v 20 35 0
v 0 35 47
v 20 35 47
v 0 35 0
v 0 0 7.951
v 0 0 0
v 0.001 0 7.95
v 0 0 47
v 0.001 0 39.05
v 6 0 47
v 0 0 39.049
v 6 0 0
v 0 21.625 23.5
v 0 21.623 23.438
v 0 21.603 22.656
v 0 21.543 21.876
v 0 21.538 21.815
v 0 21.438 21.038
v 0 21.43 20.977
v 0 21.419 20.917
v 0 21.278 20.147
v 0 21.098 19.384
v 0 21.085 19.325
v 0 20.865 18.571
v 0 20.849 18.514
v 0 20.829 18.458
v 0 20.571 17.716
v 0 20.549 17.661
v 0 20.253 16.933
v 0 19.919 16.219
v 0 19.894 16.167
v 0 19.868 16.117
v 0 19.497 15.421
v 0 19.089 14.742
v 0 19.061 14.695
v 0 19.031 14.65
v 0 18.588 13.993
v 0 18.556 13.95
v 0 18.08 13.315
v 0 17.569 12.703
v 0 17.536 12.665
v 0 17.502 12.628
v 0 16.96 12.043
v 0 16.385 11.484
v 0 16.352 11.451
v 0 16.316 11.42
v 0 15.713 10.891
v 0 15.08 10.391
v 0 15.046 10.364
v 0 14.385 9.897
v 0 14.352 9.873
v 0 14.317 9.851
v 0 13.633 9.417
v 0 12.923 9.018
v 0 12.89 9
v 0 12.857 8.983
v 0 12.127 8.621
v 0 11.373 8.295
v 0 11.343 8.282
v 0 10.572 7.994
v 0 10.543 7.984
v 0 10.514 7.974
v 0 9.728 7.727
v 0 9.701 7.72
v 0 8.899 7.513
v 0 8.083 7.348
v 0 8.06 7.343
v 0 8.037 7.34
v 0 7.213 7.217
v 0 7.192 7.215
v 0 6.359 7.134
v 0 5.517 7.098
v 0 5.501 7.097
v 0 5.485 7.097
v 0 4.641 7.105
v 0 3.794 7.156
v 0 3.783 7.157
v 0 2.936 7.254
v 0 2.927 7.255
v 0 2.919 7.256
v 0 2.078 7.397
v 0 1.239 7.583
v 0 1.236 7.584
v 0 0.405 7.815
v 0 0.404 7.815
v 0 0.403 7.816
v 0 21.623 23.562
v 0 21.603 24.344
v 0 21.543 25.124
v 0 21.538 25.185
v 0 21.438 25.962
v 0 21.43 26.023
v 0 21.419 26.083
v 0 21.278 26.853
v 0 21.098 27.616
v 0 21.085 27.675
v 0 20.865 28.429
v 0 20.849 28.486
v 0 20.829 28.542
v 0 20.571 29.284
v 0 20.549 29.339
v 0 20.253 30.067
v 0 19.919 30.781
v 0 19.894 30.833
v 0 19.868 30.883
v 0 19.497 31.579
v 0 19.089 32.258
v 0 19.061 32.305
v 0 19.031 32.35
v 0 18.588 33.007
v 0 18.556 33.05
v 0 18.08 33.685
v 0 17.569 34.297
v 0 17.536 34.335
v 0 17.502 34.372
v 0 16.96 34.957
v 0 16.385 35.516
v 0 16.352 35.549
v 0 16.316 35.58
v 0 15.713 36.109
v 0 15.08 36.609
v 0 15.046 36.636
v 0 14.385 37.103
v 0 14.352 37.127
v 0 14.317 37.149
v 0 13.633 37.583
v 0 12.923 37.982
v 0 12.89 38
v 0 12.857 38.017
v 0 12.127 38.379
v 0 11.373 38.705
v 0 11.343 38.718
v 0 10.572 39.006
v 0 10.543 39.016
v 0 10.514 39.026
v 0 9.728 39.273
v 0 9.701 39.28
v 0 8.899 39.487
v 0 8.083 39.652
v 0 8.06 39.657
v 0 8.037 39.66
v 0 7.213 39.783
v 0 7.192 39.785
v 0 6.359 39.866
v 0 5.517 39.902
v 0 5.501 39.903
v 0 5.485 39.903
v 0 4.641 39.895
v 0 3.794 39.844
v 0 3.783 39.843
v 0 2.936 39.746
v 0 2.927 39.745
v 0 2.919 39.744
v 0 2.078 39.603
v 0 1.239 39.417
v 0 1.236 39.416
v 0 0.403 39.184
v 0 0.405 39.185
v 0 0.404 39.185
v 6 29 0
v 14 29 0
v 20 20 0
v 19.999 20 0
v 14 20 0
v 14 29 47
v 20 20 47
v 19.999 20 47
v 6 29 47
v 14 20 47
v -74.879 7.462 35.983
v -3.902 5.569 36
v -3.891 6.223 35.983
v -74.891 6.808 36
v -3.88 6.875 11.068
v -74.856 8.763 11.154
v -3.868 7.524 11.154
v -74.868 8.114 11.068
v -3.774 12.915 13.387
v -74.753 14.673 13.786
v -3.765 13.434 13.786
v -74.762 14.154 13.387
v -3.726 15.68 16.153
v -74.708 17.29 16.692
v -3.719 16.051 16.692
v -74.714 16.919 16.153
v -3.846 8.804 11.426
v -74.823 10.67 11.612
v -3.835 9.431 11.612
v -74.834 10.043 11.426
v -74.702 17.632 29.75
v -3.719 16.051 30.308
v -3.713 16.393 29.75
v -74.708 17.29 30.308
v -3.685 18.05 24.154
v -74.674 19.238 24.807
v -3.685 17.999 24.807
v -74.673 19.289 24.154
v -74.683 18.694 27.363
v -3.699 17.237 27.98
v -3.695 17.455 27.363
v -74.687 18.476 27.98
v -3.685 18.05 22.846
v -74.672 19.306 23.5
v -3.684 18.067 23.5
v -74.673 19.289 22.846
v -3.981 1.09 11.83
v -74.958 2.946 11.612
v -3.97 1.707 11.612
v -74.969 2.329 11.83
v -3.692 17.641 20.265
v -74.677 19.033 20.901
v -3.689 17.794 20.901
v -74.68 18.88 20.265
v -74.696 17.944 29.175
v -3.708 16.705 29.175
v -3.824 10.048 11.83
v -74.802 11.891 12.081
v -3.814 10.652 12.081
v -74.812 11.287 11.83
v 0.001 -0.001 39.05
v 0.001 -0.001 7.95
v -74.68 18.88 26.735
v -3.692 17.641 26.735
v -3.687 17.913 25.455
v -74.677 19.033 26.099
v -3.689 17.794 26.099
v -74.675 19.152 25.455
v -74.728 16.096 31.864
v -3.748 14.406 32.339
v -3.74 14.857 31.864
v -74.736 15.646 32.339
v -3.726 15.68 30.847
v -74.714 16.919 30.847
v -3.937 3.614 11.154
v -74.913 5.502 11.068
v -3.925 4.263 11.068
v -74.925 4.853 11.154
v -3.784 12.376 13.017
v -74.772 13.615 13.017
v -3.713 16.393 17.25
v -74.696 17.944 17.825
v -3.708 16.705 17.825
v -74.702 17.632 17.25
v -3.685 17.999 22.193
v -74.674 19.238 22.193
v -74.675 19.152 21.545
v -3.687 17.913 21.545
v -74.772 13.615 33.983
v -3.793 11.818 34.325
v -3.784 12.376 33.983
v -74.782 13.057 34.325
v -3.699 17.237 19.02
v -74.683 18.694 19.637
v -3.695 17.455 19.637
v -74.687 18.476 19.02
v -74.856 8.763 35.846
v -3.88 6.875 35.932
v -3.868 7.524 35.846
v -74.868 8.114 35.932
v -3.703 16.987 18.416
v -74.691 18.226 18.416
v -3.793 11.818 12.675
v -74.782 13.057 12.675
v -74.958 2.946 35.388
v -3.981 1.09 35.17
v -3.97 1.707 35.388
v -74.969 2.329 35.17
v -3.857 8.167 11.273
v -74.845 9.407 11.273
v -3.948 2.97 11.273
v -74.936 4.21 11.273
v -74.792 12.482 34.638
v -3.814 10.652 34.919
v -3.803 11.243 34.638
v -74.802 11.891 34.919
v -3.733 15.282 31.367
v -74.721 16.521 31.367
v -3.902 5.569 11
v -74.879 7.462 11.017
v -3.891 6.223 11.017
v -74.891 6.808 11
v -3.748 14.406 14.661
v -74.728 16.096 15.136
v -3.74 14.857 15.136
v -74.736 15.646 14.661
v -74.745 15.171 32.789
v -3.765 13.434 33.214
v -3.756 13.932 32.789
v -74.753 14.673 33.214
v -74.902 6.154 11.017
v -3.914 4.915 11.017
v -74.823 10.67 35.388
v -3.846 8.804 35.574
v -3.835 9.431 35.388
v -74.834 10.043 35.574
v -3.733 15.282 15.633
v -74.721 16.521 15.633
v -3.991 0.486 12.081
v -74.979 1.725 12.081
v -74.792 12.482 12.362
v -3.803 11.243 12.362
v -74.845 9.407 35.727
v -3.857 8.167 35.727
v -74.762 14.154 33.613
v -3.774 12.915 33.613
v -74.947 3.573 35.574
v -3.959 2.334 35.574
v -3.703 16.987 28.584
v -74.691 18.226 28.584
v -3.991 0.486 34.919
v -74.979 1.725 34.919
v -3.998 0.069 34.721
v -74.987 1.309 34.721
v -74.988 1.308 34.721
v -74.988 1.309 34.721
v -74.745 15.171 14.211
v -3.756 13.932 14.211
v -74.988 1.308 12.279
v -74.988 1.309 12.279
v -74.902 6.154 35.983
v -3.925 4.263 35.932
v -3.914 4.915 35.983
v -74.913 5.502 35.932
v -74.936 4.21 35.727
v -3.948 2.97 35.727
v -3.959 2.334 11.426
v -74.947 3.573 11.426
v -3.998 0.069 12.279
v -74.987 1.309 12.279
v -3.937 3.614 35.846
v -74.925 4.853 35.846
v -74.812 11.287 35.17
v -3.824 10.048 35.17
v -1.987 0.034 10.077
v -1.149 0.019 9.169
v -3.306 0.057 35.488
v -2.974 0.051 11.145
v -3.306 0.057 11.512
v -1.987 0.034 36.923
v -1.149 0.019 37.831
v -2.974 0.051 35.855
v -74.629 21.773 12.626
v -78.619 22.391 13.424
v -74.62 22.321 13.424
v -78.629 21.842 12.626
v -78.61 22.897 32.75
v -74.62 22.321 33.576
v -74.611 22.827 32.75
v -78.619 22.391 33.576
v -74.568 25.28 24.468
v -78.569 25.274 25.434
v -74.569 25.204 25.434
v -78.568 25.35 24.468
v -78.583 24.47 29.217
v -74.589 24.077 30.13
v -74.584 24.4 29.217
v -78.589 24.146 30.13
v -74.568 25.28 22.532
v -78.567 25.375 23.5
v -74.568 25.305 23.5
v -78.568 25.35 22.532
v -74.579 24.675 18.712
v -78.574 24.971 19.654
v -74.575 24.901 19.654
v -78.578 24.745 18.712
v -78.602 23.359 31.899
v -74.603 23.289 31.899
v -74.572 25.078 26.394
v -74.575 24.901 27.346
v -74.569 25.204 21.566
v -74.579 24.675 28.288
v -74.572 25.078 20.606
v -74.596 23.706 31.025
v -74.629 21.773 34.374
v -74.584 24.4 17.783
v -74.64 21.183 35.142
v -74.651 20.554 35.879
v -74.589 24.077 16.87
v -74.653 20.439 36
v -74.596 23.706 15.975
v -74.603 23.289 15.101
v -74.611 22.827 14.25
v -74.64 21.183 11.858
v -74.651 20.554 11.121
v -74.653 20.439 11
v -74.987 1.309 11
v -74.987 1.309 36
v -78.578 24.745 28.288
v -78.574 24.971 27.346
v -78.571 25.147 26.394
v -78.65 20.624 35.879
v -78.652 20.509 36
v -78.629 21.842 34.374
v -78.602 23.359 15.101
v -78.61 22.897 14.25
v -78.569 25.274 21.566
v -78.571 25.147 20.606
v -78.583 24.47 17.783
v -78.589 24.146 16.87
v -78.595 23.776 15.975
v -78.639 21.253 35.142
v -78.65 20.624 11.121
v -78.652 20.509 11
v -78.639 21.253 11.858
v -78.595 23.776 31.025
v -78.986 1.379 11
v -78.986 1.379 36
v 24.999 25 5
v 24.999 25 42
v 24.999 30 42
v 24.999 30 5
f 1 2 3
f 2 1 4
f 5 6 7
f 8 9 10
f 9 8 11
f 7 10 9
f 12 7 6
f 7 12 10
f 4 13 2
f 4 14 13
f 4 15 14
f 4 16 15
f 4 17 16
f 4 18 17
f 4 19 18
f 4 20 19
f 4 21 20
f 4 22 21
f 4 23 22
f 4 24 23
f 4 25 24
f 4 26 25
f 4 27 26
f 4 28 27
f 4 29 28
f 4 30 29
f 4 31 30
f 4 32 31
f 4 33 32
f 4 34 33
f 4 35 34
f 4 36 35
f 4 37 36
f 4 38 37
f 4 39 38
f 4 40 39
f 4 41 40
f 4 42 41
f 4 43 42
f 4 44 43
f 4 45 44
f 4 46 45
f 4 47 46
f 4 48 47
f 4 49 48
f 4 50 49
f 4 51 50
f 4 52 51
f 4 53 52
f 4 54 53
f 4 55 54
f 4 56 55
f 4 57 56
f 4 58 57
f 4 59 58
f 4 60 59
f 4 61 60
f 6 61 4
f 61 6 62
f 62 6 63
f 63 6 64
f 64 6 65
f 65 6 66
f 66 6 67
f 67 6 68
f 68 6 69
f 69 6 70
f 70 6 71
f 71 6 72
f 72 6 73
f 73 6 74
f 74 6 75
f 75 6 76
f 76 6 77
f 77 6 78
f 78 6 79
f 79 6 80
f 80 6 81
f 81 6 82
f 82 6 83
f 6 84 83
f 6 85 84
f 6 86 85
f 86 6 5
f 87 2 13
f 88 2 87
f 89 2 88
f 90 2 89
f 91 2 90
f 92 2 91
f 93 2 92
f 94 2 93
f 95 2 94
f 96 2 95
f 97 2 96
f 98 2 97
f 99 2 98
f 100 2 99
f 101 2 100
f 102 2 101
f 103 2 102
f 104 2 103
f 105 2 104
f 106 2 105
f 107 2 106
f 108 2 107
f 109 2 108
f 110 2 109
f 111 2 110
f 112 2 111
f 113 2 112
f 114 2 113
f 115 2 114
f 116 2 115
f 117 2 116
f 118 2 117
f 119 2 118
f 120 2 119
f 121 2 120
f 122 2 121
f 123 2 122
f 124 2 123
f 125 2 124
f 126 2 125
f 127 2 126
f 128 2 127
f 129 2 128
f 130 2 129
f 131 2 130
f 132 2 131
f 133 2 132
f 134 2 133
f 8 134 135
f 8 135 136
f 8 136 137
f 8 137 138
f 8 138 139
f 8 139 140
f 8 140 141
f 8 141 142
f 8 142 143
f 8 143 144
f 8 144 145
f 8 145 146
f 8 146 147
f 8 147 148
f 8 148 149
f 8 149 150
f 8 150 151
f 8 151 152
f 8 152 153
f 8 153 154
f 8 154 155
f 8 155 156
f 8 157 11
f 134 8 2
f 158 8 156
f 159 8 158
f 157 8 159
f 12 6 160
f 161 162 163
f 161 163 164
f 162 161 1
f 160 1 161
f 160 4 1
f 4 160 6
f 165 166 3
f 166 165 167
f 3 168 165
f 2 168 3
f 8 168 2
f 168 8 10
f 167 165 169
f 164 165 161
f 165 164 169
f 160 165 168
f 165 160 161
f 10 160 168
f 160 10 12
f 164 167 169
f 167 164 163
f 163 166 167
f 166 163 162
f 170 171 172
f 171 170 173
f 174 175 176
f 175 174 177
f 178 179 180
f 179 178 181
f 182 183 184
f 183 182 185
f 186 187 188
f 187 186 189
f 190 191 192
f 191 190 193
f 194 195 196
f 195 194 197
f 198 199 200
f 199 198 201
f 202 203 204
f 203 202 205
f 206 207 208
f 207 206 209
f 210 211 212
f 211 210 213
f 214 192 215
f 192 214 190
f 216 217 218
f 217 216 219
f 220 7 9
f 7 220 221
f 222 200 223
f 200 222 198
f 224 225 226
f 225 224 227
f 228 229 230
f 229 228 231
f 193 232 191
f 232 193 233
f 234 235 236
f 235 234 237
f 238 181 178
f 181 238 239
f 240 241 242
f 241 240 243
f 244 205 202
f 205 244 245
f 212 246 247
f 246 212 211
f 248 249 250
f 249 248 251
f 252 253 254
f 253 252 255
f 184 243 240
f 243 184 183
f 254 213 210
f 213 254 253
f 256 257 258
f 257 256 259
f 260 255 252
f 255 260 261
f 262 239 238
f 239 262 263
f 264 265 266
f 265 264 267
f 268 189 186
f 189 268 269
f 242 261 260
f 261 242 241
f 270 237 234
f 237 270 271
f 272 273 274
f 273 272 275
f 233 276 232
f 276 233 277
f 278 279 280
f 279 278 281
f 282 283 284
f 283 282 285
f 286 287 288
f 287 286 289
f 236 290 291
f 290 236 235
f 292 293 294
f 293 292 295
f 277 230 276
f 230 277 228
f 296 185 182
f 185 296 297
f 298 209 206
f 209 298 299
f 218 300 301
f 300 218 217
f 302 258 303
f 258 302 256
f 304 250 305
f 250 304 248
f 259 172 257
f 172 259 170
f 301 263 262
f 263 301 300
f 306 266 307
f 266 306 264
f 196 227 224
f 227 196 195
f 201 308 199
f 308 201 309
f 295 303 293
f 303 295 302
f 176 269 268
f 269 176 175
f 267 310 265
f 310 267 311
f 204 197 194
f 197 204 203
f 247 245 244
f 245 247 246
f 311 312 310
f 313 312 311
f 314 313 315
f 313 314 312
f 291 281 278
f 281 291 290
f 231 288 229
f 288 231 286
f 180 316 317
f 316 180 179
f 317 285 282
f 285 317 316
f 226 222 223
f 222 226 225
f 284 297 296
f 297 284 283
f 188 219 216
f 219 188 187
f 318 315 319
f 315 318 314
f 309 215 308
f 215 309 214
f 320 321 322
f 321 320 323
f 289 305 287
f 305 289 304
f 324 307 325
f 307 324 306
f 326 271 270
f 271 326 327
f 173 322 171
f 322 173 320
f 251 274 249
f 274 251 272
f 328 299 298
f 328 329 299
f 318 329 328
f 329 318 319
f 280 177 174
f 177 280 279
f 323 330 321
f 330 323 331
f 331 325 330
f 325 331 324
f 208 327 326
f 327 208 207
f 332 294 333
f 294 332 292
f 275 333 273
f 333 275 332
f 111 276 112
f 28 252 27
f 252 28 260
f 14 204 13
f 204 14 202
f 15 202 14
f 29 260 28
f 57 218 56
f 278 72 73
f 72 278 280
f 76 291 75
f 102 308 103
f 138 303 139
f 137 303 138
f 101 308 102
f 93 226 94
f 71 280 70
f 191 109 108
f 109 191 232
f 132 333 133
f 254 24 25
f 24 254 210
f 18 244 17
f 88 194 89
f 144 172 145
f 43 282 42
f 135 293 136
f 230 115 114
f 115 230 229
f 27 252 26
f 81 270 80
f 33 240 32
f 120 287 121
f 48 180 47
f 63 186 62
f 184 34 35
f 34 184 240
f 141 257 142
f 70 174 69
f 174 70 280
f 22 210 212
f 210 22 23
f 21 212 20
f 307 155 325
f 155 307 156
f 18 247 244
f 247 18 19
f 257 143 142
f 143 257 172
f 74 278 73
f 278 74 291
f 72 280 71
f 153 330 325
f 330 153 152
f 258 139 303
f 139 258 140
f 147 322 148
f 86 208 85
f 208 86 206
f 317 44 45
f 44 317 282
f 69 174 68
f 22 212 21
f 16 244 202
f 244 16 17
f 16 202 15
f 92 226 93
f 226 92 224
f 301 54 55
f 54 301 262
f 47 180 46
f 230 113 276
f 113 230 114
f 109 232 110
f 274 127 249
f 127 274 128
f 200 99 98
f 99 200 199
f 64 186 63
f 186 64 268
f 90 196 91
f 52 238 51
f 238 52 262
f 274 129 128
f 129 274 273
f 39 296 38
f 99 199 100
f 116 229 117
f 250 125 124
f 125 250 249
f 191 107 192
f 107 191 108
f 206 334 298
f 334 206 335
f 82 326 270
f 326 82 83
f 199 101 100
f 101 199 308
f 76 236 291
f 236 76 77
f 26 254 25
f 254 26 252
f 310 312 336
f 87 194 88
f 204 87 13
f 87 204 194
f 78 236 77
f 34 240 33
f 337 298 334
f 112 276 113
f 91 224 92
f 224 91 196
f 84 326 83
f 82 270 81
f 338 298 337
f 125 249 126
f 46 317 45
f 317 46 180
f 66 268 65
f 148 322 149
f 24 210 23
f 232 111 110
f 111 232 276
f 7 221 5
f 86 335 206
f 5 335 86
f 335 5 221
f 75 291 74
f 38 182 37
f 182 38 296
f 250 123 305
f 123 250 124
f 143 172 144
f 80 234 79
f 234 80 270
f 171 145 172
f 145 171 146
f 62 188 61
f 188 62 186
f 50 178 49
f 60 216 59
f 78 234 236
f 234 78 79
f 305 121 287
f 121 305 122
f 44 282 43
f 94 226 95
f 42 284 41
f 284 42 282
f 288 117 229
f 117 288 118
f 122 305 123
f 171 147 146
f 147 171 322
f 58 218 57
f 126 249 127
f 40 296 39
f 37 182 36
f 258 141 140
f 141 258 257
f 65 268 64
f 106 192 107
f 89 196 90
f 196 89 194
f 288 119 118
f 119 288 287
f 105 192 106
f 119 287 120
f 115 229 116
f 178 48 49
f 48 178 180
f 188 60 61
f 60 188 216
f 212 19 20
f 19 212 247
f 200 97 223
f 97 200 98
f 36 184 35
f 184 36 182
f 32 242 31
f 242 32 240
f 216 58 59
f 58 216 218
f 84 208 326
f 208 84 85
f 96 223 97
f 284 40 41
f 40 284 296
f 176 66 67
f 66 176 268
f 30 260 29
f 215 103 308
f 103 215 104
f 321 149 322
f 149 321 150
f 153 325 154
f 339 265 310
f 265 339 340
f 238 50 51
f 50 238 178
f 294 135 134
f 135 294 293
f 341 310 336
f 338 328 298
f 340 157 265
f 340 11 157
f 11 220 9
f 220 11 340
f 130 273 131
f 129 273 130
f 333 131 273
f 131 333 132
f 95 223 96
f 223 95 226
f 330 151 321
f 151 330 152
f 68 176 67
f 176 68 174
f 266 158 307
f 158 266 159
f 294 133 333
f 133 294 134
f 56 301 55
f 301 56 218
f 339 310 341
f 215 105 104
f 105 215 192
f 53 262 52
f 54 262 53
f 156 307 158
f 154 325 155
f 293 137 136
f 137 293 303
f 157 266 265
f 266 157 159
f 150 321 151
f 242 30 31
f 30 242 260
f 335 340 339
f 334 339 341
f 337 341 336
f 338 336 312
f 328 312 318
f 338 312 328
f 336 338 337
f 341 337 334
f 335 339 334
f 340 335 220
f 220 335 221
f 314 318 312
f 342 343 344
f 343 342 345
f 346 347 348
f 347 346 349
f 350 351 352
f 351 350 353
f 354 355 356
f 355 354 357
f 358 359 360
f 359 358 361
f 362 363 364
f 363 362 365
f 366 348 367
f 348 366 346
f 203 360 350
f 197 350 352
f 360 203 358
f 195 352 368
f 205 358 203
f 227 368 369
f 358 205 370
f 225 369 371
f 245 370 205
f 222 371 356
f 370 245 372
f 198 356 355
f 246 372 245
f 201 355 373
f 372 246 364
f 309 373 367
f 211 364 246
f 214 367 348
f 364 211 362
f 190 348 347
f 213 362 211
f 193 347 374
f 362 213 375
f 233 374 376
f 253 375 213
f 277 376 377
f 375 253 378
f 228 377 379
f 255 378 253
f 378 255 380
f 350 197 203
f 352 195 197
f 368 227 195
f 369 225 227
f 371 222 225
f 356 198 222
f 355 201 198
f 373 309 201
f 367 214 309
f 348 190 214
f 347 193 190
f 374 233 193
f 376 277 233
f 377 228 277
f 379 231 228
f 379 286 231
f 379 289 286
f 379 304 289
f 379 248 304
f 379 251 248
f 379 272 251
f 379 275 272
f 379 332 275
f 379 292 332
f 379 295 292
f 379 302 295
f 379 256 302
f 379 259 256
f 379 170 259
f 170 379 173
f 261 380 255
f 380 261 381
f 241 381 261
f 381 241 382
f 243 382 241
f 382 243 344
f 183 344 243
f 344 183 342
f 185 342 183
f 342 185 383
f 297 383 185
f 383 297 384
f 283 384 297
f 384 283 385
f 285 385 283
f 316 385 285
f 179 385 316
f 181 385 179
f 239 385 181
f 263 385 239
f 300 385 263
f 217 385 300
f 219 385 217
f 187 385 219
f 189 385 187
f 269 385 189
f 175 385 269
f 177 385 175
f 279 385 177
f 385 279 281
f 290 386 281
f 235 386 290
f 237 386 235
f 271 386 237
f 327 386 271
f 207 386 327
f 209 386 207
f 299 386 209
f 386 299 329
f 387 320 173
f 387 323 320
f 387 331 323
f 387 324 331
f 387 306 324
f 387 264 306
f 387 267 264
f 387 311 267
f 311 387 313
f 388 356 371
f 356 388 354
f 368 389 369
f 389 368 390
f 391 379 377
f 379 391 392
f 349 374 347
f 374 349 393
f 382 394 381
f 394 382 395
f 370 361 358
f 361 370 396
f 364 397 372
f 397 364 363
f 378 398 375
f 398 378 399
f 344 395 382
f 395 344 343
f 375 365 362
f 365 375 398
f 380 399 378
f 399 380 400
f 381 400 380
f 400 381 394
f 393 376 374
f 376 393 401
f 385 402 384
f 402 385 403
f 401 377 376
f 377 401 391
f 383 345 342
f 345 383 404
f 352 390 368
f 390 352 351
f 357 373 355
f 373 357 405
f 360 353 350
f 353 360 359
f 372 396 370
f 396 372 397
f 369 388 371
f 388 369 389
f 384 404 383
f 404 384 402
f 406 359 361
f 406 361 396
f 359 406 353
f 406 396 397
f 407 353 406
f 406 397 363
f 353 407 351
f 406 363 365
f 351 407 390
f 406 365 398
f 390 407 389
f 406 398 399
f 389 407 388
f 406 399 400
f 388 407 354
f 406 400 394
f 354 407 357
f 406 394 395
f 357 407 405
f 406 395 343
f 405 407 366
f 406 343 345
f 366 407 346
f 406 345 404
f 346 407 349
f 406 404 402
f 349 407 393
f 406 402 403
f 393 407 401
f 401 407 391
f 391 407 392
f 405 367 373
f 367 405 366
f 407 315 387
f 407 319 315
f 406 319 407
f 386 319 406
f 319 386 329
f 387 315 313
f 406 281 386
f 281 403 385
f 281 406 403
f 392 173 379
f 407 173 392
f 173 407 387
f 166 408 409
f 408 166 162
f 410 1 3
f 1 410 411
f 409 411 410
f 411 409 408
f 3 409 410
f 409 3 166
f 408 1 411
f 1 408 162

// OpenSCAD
// The width of the hanger. Should fit the printer's slot width.
hanger_width = 47;  

// The height of the hanger tab. Should fit the printer's slot height.
inner_tab_height = 15;

// The width of the hanger slot. Should fit printer's wall thickness.
slot_thickness = 8;

// The external height of the hanger.
hanger_height = 35;

// The length of the rod. Should fit the spool inner width.
rod_length = 75;  

// The diameter of the rod.
rod_diameter = 25;

// The ehight of the top of the rod from the bottom of the hanger.
rod_height = 18;

// Raise the end of the rod by this angle. Use to compensate for 
// free play in the hanger slot.
rod_pitch_angle = 1.0;

// Thickness of the hanger's walls.
hanger_wall = 6;

// The height of the end stopper above the top of the rod.
stopper_margin = 6;

// The thickness of the stopper at the end of the rod.
stopper_thickness = 4;

/* [Hidden] */

// Faces per cylinder.
$fn=120;

hanger_thickness = slot_thickness + 2*hanger_wall;

stopper_diameter = rod_diameter+2*stopper_margin;

rod_radius = rod_diameter/2;

rod_center_z = -(rod_radius - rod_height);

// The size of the support at the corner between the rod and the hanger.
corner_size = 4;

// Adding to the internal tab a bump with diagonal edges for easier 
// alighment into the printer hole.
bump_size = 5;

// Small values to maintain manifold.
eps1 = 0.001;
eps2 = 2*eps1;


module bump() {
  translate([hanger_thickness-eps1, -hanger_width/2, hanger_height]) 
  rotate([0, 90, 0]) hull() {
    cube([inner_tab_height, hanger_width, eps1]);  
    translate([bump_size, bump_size, bump_size-eps1])
      cube([inner_tab_height - 2*bump_size, hanger_width-2*bump_size, eps1]);  
  }
}

module hanger() {
  translate([0, -hanger_width/2, 0]) difference() {
    cube([hanger_thickness,  hanger_width, hanger_height]);
    
    translate([hanger_wall, -eps1, -eps1]) 
      cube([slot_thickness, hanger_width+eps2, hanger_height-hanger_wall+eps1]);
    
    translate([hanger_wall + slot_thickness - eps1, -eps1, -eps1]) 

      cube([hanger_wall+eps2, hanger_width+eps2, hanger_height-inner_tab_height+eps1]);
  }
}

module rod() {
  intersection() {
    union() {
      // Rod.
      translate([0, 0, rod_center_z]) rotate([0, -90, 0]) 
          cylinder(d= rod_diameter, h=   rod_length);
      // Corner support.
      translate([0, 0, rod_center_z]) rotate([0, -90, 0]) 
          cylinder(d1=  rod_diameter+2*corner_size, d2=rod_diameter, h=corner_size); 
    }
    // Cut bottom.
    translate([-rod_length-eps1, -rod_diameter, -eps1]) 
        cube([rod_length+eps2, 2*rod_diameter, rod_height + corner_size+ eps1]);
  }
}

module stopper() {
  translate([-rod_length, 0, 0])  
  intersection() {
    translate([0, 0, rod_center_z]) rotate([0, -90, 0]) 
      cylinder(d=stopper_diameter, stopper_thickness);  
    
     translate([-stopper_thickness-eps1, -rod_diameter/2, 0]) 
       cube([stopper_thickness+eps2, rod_diameter, stopper_diameter]);
  }
}

module main() {
  hanger();
  bump();
  rotate([0, rod_pitch_angle, 0]) union() {
    translate([eps1, 0, 0]) rod();
    translate([eps2, 0, 0]) stopper();
  }
}

//main();

// Transformation to printing orientation. This keeps the 3D fibers 
// along the rod and the hanger for max strength. Make sure to 
// enable support material.
translate([0, 0, hanger_width/2]) rotate([-90, 0, 0]) main();
